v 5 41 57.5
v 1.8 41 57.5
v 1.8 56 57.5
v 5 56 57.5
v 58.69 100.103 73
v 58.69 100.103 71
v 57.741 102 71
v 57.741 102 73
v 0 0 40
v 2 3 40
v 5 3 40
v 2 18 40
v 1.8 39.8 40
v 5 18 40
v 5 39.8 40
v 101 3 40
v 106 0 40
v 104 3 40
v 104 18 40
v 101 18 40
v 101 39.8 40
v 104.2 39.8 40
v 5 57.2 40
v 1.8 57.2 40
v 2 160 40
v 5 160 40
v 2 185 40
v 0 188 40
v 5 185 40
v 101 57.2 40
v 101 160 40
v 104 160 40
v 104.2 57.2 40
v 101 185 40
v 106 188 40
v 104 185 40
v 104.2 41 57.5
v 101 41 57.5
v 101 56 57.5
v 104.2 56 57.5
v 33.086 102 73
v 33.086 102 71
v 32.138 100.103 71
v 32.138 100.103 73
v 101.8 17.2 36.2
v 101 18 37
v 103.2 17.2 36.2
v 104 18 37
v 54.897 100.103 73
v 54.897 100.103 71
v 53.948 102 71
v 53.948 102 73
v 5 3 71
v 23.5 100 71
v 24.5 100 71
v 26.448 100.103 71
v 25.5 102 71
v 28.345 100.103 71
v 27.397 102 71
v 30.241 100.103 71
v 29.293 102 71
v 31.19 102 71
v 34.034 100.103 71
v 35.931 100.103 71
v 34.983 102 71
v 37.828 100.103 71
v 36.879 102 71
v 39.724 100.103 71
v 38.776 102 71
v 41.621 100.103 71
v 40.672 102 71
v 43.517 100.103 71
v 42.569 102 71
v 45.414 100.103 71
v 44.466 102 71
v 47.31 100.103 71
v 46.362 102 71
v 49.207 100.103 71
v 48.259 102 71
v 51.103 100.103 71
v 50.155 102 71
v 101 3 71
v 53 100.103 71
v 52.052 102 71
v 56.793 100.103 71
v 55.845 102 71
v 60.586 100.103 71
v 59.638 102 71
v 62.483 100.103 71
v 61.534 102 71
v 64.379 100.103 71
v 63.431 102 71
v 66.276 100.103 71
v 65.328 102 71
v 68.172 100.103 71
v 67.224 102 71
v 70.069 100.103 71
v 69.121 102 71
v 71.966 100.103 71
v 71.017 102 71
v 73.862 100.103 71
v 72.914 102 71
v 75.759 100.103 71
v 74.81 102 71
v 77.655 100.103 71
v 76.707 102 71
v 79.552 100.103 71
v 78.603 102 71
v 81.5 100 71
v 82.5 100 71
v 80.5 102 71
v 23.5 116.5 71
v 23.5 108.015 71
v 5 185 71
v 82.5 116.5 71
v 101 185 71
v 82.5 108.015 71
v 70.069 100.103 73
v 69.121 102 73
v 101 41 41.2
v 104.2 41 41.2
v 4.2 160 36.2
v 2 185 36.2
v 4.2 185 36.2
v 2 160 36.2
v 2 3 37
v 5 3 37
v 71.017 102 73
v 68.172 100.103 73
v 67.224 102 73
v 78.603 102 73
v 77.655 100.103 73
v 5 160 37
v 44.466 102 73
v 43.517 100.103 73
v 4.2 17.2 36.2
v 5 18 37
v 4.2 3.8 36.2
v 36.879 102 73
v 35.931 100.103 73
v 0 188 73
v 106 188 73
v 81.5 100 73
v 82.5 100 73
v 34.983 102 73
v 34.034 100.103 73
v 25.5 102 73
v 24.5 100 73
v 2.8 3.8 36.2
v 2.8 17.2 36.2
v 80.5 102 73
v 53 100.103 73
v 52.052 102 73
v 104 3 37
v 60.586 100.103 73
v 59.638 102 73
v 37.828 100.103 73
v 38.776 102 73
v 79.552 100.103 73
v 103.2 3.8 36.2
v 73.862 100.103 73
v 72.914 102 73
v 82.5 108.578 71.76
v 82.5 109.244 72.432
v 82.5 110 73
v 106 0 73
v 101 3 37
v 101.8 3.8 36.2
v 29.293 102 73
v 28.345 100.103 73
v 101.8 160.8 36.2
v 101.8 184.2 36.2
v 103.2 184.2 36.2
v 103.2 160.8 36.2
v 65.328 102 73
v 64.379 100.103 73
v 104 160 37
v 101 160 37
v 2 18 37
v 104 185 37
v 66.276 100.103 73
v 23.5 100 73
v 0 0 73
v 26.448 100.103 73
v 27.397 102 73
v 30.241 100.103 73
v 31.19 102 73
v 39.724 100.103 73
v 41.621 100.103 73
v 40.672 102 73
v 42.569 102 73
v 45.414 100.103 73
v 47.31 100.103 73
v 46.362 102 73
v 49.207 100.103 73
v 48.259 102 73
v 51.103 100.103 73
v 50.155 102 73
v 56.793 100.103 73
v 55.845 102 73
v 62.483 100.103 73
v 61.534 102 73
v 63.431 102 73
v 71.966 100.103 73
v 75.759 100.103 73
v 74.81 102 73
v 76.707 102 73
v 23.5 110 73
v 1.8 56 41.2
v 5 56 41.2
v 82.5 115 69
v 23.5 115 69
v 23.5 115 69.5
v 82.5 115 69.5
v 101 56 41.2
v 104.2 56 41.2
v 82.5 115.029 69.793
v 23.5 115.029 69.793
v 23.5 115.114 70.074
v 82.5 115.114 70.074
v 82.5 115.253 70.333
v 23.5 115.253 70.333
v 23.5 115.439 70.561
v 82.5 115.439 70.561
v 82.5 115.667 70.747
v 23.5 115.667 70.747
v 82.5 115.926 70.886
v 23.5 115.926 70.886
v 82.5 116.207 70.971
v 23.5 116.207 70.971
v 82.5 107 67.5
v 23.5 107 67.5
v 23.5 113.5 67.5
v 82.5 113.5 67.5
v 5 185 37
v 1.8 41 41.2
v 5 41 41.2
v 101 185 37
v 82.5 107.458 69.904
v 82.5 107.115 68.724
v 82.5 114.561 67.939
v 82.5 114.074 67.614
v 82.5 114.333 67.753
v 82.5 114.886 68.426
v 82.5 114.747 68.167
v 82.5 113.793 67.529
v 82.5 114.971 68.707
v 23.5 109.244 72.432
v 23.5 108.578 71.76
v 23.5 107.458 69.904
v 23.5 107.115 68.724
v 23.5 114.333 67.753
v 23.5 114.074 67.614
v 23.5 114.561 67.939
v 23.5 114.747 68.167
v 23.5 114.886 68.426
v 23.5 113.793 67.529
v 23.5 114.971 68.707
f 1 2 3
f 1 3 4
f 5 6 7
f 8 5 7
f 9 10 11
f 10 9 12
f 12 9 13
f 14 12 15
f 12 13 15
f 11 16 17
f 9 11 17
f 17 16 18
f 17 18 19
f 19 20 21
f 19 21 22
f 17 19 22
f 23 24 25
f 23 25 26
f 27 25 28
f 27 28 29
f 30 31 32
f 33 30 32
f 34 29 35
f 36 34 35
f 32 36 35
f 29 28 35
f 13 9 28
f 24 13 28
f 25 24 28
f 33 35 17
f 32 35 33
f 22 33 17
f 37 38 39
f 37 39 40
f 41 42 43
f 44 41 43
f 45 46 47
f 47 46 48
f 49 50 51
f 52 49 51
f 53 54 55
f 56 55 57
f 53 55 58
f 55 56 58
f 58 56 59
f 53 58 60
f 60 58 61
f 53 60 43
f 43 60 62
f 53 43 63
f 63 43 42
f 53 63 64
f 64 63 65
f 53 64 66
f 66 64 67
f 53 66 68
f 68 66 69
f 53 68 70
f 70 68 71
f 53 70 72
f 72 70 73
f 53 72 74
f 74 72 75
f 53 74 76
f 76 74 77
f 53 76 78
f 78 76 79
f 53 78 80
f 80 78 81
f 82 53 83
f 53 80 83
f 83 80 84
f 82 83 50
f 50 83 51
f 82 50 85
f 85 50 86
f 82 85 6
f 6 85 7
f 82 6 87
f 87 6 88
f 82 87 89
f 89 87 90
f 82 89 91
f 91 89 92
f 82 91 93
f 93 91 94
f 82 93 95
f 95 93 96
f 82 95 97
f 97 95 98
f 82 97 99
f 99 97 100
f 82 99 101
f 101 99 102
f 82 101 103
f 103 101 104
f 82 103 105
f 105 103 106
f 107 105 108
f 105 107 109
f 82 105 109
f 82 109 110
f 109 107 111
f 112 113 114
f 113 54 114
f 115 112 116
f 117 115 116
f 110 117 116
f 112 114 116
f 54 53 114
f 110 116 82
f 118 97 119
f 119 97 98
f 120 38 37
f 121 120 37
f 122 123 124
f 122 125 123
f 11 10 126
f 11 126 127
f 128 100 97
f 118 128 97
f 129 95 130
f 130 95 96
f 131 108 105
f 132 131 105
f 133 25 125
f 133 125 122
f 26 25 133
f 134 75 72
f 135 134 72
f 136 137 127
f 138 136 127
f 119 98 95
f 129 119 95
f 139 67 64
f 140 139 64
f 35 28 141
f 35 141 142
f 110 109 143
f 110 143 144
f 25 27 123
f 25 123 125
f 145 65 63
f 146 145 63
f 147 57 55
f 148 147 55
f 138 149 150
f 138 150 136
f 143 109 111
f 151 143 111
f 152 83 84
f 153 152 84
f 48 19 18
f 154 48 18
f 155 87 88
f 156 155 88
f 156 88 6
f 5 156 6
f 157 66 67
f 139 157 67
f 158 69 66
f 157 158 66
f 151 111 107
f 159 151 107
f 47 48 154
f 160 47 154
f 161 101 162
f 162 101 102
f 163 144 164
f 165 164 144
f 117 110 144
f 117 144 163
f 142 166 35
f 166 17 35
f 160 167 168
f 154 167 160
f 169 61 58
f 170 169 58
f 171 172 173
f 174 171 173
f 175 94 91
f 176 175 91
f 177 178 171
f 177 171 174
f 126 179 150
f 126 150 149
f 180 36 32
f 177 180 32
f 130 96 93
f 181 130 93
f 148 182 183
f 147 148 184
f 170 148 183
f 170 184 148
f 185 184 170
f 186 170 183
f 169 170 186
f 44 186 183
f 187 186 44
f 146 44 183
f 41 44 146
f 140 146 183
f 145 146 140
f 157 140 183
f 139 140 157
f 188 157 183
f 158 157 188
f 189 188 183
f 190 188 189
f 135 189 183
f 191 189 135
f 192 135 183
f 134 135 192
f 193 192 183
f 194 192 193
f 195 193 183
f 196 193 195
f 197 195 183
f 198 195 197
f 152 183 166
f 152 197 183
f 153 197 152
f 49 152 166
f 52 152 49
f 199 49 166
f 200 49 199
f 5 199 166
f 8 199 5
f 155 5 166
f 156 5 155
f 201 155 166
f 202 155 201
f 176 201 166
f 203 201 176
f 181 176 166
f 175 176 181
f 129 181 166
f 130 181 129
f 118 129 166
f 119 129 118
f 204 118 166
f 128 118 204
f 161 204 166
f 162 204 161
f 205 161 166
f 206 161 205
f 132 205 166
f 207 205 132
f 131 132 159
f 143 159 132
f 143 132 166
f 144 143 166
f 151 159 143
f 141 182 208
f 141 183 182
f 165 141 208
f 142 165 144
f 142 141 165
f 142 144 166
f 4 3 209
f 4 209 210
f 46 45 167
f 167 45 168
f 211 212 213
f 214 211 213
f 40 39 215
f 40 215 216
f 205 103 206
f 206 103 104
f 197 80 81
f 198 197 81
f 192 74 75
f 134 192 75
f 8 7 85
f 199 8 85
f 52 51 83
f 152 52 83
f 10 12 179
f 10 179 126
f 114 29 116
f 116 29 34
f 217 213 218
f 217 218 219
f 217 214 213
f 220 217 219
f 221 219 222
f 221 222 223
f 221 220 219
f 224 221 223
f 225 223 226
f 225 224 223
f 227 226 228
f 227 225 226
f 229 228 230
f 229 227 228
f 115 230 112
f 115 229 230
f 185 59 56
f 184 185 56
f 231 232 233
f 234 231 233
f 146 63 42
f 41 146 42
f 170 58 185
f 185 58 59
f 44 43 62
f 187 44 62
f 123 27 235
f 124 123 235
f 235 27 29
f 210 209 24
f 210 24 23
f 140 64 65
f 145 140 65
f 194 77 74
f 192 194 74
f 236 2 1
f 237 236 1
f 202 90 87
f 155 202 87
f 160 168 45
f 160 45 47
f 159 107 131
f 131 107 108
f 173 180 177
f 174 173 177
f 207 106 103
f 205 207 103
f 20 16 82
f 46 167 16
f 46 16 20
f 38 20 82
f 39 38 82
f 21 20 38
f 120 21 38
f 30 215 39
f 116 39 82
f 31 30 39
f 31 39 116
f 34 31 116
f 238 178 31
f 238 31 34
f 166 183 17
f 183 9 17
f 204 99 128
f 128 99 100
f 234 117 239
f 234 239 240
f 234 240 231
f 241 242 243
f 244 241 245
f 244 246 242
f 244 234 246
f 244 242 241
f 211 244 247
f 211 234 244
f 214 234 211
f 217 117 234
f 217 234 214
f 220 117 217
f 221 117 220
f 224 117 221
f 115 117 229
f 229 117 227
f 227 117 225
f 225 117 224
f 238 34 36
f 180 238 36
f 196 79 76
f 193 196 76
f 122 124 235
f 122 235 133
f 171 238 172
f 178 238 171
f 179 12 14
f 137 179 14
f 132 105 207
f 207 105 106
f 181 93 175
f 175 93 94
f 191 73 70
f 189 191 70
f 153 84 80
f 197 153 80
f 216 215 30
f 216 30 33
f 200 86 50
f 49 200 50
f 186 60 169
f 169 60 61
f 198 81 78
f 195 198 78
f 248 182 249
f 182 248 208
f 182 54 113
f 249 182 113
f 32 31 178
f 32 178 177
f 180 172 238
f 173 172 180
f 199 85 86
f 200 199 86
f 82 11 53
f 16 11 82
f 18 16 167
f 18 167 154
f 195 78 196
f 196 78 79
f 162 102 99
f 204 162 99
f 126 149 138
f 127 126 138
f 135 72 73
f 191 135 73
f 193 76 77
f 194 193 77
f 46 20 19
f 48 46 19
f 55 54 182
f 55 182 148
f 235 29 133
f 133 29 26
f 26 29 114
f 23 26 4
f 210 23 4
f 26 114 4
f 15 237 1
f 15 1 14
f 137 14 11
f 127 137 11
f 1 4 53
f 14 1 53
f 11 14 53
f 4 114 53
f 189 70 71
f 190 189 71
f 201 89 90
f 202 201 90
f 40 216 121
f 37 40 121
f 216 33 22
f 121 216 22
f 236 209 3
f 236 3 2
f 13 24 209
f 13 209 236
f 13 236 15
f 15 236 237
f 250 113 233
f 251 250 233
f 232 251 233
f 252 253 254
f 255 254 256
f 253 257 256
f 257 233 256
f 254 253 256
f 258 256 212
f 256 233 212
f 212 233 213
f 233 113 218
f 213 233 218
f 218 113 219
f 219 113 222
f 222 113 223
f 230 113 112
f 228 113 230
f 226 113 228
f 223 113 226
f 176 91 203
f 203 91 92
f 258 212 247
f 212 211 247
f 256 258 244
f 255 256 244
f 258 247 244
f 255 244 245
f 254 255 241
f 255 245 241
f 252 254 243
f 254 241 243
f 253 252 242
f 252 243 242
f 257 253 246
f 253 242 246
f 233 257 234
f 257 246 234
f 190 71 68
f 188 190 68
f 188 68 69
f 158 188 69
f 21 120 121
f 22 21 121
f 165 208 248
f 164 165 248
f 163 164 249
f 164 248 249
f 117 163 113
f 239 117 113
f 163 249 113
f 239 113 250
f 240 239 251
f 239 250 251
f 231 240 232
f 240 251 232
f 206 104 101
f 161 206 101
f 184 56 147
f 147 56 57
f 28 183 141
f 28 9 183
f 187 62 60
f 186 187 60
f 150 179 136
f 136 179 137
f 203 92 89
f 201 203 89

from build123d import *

# Parameters (mm, degrees)
SKETCH016_W         = 106
SKETCH016_H         = 188
SKETCH016_W_2       = 96
SKETCH016_H_2       = 182
PAD010_DEPTH        = 31
SKETCH017_W         = 3
SKETCH017_H         = 15
SKETCH017_H_2       = 25
PAD011_DEPTH        = 3.8
SKETCH018_W         = 3.2
SKETCH018_H         = 15
POCKET006_DEPTH     = 17.5
SKETCH019_W         = 106
SKETCH019_H         = 188
SKETCH019_W_2       = 59
SKETCH019_H_2       = 10
PAD012_DEPTH        = 2
CHAMFER001_SIZE     = 0.8
CHAMFER002_SIZE     = 1.2
PAD013_DEPTH        = 2
LINEARPATTERN_COUNT = 30
LINEARPATTERN_PITCH = 1.896552
PAD014_DEPTH        = 59
FILLET_R            = 1.5


with BuildPart() as part:
    # Sketch016 → Pad010 (new body)
    with BuildSketch(Plane.XY):
        with Locations((53, 94)):
            Rectangle(SKETCH016_W, SKETCH016_H)
        with Locations((53, 94)):
            Rectangle(SKETCH016_W_2, SKETCH016_H_2, mode=Mode.SUBTRACT)
    extrude(amount=PAD010_DEPTH)

    # Sketch017 (on Face9 of Pad010) → Pad011 (join)
    with BuildSketch(Plane(origin=(0, 0, 0), x_dir=(1, 0, 0), z_dir=(0, 0, -1))):
        with Locations((3.5, -10.5)):
            Rectangle(SKETCH017_W, SKETCH017_H)
        with Locations((3.5, -172.5)):
            Rectangle(SKETCH017_W, SKETCH017_H_2)
        with Locations((102.5, -172.5)):
            Rectangle(SKETCH017_W, SKETCH017_H_2)
        with Locations((102.5, -10.5)):
            Rectangle(SKETCH017_W, SKETCH017_H)
    extrude(amount=PAD011_DEPTH)

    # Sketch018 (on Face4 of Pad011) → Pocket006 (cut)
    with BuildSketch(Plane(origin=(0, 0, 0), x_dir=(1, 0, 0), z_dir=(0, 0, -1))):
        with Locations((3.4, -48.5)):
            Rectangle(SKETCH018_W, SKETCH018_H)
        with Locations((102.6, -48.5)):
            Rectangle(SKETCH018_W, SKETCH018_H)
    extrude(amount=-POCKET006_DEPTH, mode=Mode.SUBTRACT)

    # Sketch019 (on Face5 of Pocket006) → Pad012 (join)
    with BuildSketch(Plane.XY.offset(31)):
        with Locations((53, 94)):
            Rectangle(SKETCH019_W, SKETCH019_H)
        with Locations((53, 105)):
            Rectangle(SKETCH019_W_2, SKETCH019_H_2, mode=Mode.SUBTRACT)
    extrude(amount=PAD012_DEPTH)

    # Chamfer001
    chamfer001_edges = [part.edges().sort_by_distance(p)[0] for p in [
        (101, 10.5, -3.8),
        (102.5, 18, -3.8),
        (104, 10.5, -3.8),
        (102.5, 3, -3.8),
        (102.5, 185, -3.8),
        (104, 172.5, -3.8),
        (102.5, 160, -3.8),
        (101, 172.5, -3.8),
        (5, 172.5, -3.8),
        (3.5, 3, -3.8),
        (2, 10.5, -3.8),
        (3.5, 18, -3.8),
        (5, 10.5, -3.8),
    ]]
    chamfer(chamfer001_edges, length=CHAMFER001_SIZE)

    # Chamfer002
    chamfer002_edges = [part.edges().sort_by_distance(p)[0] for p in [
        (102.6, 56, 0),
        (102.6, 41, 0),
        (3.4, 41, 0),
        (3.4, 56, 0),
    ]]
    chamfer(chamfer002_edges, length=CHAMFER002_SIZE)

    # Sketch020 (on Face12 of Chamfer002) → Pad013 (join)
    with BuildSketch(Plane(origin=(0, 0, 31), x_dir=(1, 0, 0), z_dir=(0, 0, -1))):
        Polygon((81.5, -100), (80.5, -102), (79.5, -100), align=None)
    pad013 = extrude(amount=-PAD013_DEPTH)

    # LinearPattern: Pad013 ×30
    with Locations(*[(-i * LINEARPATTERN_PITCH, 0, 0) for i in range(1, LINEARPATTERN_COUNT)]):
        add(pad013)

    # Sketch021 (on Face112 of LinearPattern) → Pad014 (join)
    with BuildSketch(Plane.YZ.offset(23.5)):
        with BuildLine():
            ThreePointArc((110, 33), (107.798766, 30.632491), (107, 27.5))
            Line((107, 27.5), (115, 27.5))
            Line((115, 27.5), (115, 31))
            Line((110, 31), (115, 31))
            Line((110, 33), (110, 31))
        make_face()
    extrude(amount=PAD014_DEPTH)

    # Fillet
    fillet_edges = [part.edges().sort_by_distance(p)[0] for p in [
        (53, 115, 31),
        (53, 115, 27.5),
    ]]
    fillet(fillet_edges, radius=FILLET_R)


with BuildPart() as part_1:
    # Body003 placement: moved
    add(part.part.moved(Location((0, 0, 40))))


solid = part_1.part
